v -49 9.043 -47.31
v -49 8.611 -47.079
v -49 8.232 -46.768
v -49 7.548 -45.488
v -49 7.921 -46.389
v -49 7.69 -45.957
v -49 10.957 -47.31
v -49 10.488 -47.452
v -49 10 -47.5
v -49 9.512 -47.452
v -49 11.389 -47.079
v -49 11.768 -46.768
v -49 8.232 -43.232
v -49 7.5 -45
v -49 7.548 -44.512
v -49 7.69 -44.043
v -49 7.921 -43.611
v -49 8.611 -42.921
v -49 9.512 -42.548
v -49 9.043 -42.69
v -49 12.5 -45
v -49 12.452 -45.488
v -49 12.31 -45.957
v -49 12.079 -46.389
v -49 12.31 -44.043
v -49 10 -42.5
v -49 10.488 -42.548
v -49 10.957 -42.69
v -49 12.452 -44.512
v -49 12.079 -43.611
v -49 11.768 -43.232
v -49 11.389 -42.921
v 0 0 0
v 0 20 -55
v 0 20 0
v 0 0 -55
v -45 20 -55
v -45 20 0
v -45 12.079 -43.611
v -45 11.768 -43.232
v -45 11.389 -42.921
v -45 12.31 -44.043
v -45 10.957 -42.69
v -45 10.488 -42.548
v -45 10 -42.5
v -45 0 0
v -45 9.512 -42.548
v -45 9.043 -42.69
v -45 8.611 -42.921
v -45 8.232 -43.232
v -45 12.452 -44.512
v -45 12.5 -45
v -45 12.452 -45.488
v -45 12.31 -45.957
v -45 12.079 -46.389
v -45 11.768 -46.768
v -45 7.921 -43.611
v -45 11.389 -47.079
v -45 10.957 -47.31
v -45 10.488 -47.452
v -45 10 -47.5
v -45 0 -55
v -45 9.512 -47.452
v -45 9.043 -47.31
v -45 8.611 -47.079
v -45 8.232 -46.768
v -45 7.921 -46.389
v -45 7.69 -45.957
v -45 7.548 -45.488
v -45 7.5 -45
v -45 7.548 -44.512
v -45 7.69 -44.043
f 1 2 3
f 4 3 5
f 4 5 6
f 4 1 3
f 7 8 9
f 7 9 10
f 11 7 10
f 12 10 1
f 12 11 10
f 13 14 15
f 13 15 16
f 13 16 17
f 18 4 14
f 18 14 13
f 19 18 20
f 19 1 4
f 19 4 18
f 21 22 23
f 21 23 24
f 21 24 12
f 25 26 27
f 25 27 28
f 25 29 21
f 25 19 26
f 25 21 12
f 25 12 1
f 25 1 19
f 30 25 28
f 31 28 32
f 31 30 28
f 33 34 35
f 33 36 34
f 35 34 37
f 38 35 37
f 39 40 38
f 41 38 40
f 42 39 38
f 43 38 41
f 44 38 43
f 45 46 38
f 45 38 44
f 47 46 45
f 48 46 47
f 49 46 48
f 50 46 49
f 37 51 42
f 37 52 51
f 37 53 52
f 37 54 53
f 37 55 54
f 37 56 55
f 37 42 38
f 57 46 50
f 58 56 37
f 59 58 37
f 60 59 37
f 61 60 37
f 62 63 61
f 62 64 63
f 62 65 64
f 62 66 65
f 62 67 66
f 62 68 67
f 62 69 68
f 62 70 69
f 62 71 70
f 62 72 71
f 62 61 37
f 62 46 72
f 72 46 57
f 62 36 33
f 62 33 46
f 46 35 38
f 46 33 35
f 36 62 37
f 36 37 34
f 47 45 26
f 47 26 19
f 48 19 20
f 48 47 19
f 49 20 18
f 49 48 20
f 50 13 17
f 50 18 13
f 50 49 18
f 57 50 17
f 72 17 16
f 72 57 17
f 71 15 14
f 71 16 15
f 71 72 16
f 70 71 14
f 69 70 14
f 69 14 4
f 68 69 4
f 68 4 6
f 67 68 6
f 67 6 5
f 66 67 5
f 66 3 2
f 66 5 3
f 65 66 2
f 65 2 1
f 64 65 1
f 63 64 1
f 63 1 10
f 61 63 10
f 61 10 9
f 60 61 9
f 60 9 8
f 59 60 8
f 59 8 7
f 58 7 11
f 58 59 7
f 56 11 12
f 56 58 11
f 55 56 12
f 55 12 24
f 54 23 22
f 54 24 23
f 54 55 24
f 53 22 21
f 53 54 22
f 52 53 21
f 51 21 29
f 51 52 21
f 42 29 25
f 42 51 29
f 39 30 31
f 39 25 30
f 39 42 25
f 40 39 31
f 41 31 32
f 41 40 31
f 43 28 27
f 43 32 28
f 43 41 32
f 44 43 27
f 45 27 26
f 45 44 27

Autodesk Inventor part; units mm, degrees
ref_plane "YZ Plane" through (0, 0, 0) normal (1, 0, 0) x (0, 1, 0)
ref_plane "XZ Plane" through (0, 0, 0) normal (0, 1, 0) x (-1, 0, 0)
ref_plane "XY Plane" through (0, 0, 0) normal (0, 0, 1) x (1, 0, 0)
sketch "Sketch1" plane through (0, 0, 0) normal (0, 1, 0) x (-1, 0, 0)
  line L0 (0, 0) -> (45, 0)
  line L1 (45, 0) -> (45, -55)
  line L2 (45, -55) -> (0, -55)
  line L3 (0, -55) -> (0, 0)
  dimension "d0" = 45
  dimension "d1" = 55
extrude "Extrusion1" add sketch "Sketch1" along normal blind 20
sketch "Sketch2" plane through (-45, 0, -55) normal (-1, 0, 0) x (0, 0, 1)
  circle A0 centre (10, 10) radius 2.5
  line L0 (0, 0) -> (0, 20) projected
  line L1 (0, 0) -> (55, 0) projected
  dimension "d4" = 10
  dimension "d5" = 10
  dimension "d6" = 5
extrude "Extrusion2" add sketch "Sketch2" along normal blind 4
properties part number "servo mg958 dummy"
